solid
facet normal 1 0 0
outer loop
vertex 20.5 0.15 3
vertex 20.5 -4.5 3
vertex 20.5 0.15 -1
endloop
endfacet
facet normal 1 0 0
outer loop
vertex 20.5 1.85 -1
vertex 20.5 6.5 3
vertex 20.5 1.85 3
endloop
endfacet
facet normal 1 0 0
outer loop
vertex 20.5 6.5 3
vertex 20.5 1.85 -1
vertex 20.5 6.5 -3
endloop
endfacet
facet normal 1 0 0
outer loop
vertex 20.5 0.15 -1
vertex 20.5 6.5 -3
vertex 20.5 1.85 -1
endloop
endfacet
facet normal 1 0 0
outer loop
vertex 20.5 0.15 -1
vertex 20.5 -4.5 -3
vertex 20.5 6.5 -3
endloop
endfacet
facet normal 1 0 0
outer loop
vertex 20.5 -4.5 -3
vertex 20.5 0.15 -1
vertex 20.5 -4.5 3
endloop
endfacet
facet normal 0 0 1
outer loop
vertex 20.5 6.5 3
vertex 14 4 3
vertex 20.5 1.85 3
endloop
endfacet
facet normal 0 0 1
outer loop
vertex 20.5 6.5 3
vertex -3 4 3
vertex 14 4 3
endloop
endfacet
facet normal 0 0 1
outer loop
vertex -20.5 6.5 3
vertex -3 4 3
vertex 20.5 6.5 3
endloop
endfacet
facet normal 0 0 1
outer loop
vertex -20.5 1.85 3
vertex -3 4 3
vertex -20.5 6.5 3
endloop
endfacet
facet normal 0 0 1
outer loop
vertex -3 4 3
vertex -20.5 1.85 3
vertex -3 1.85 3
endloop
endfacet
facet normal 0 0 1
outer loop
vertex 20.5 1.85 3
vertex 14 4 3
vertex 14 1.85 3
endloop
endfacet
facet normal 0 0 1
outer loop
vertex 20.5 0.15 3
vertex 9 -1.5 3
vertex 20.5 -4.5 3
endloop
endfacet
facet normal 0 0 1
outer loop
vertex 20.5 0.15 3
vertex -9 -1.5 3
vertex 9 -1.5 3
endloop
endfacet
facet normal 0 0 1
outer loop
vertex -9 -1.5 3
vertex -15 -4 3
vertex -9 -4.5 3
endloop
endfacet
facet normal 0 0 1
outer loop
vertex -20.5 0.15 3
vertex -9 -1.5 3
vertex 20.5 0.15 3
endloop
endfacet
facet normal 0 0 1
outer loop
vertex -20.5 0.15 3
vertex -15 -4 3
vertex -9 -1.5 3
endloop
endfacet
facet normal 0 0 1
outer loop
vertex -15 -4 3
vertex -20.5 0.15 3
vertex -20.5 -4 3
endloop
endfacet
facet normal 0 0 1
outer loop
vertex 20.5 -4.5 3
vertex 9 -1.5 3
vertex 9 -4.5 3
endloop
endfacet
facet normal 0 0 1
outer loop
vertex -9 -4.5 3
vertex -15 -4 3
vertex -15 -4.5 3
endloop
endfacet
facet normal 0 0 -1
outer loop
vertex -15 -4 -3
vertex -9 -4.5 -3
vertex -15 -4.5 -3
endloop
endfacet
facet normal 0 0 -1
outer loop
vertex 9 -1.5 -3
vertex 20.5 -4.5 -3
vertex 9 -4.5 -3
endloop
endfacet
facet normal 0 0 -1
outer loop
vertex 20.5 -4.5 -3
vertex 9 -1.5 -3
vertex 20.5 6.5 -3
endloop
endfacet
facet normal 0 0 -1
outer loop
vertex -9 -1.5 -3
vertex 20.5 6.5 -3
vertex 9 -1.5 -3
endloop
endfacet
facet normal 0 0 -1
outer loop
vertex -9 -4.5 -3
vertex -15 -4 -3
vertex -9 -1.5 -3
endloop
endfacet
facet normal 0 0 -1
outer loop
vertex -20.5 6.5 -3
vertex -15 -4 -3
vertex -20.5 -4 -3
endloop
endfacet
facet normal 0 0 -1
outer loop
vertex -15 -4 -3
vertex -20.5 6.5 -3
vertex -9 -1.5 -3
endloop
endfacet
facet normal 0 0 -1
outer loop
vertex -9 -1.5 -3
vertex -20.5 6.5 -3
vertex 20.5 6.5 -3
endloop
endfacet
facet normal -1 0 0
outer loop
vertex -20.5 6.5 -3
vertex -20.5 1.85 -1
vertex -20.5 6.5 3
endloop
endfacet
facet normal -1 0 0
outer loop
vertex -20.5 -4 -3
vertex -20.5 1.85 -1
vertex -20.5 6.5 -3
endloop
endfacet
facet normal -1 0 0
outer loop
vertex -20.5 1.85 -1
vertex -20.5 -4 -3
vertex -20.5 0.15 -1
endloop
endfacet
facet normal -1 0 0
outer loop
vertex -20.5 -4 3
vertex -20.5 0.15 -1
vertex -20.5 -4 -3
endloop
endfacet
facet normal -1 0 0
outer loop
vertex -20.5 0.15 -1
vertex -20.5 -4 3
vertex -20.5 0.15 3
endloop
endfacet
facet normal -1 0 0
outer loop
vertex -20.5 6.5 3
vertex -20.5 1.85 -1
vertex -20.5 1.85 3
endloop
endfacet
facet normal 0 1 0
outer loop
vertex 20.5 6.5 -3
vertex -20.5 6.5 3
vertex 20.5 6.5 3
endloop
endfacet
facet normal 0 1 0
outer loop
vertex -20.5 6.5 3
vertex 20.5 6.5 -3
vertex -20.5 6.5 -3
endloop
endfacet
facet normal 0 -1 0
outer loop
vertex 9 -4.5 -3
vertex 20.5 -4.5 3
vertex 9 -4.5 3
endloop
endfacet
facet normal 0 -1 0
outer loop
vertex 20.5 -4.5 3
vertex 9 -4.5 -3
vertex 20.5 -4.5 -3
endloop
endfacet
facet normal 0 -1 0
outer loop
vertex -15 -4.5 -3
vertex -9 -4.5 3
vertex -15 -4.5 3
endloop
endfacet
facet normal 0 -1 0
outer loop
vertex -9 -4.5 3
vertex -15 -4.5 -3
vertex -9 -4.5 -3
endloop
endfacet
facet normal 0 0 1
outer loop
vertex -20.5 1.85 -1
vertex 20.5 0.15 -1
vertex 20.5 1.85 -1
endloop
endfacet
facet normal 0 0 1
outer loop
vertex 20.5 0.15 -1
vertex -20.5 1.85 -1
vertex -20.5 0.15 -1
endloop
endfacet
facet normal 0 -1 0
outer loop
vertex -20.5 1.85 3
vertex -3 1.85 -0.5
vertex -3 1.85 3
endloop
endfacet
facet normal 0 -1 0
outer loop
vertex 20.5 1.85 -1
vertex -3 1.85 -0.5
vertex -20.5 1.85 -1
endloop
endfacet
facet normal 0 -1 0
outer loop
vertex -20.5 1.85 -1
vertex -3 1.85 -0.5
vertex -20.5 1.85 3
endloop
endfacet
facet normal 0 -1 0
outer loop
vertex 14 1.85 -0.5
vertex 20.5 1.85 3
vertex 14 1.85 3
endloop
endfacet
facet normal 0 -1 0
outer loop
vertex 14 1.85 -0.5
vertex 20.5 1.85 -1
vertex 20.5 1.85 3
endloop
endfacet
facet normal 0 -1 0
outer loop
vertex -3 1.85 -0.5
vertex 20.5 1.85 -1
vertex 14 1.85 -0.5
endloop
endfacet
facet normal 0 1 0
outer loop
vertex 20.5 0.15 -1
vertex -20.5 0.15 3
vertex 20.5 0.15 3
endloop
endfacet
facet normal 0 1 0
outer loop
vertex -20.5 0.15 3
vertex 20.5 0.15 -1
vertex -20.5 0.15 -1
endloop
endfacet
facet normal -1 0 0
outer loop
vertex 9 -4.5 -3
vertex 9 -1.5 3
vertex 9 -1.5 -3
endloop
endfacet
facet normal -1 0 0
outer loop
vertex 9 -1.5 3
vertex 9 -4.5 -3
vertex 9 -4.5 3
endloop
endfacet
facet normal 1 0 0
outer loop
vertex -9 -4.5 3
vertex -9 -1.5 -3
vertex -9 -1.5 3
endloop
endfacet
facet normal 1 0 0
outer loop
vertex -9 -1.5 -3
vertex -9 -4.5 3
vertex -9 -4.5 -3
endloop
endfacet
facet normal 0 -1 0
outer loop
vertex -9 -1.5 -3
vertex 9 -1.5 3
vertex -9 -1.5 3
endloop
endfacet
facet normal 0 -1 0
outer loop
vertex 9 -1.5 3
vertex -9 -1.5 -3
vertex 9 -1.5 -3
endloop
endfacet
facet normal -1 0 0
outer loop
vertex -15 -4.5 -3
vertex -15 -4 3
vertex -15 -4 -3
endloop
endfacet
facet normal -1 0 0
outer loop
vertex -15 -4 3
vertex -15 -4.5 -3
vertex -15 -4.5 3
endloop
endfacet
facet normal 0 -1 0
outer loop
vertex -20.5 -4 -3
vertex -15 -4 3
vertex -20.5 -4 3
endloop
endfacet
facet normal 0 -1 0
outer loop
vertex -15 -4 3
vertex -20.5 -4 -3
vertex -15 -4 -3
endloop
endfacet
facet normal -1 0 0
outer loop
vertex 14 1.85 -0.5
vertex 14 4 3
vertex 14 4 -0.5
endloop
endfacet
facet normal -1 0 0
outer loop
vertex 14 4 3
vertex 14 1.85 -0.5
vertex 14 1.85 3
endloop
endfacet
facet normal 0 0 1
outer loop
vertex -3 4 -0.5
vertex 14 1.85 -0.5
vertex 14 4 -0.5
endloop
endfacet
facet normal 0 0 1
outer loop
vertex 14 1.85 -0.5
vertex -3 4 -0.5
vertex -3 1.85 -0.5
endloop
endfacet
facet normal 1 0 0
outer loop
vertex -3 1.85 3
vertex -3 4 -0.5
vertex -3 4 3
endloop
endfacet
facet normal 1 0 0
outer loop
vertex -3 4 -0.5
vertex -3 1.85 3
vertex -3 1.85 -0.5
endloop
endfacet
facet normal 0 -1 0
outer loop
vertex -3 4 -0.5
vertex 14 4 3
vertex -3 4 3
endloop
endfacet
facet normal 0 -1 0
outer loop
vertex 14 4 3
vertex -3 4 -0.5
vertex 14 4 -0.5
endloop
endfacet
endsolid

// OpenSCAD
difference(){
    translate([0,1,0]){ 
        cube([41,11,6], center=true);
    }
    translate([0,1,2]){
        cube([43,1.7,6],center=true);
    }
    translate([0,-5,0]){
        cube([18,7,8],center=true);
    }
    translate([-19,-8,0]){
        cube([8,8,8],center=true);
    }
    
    translate([5.5,2.5,2]){
        cube([17,3,5],center=true);
    }
}
